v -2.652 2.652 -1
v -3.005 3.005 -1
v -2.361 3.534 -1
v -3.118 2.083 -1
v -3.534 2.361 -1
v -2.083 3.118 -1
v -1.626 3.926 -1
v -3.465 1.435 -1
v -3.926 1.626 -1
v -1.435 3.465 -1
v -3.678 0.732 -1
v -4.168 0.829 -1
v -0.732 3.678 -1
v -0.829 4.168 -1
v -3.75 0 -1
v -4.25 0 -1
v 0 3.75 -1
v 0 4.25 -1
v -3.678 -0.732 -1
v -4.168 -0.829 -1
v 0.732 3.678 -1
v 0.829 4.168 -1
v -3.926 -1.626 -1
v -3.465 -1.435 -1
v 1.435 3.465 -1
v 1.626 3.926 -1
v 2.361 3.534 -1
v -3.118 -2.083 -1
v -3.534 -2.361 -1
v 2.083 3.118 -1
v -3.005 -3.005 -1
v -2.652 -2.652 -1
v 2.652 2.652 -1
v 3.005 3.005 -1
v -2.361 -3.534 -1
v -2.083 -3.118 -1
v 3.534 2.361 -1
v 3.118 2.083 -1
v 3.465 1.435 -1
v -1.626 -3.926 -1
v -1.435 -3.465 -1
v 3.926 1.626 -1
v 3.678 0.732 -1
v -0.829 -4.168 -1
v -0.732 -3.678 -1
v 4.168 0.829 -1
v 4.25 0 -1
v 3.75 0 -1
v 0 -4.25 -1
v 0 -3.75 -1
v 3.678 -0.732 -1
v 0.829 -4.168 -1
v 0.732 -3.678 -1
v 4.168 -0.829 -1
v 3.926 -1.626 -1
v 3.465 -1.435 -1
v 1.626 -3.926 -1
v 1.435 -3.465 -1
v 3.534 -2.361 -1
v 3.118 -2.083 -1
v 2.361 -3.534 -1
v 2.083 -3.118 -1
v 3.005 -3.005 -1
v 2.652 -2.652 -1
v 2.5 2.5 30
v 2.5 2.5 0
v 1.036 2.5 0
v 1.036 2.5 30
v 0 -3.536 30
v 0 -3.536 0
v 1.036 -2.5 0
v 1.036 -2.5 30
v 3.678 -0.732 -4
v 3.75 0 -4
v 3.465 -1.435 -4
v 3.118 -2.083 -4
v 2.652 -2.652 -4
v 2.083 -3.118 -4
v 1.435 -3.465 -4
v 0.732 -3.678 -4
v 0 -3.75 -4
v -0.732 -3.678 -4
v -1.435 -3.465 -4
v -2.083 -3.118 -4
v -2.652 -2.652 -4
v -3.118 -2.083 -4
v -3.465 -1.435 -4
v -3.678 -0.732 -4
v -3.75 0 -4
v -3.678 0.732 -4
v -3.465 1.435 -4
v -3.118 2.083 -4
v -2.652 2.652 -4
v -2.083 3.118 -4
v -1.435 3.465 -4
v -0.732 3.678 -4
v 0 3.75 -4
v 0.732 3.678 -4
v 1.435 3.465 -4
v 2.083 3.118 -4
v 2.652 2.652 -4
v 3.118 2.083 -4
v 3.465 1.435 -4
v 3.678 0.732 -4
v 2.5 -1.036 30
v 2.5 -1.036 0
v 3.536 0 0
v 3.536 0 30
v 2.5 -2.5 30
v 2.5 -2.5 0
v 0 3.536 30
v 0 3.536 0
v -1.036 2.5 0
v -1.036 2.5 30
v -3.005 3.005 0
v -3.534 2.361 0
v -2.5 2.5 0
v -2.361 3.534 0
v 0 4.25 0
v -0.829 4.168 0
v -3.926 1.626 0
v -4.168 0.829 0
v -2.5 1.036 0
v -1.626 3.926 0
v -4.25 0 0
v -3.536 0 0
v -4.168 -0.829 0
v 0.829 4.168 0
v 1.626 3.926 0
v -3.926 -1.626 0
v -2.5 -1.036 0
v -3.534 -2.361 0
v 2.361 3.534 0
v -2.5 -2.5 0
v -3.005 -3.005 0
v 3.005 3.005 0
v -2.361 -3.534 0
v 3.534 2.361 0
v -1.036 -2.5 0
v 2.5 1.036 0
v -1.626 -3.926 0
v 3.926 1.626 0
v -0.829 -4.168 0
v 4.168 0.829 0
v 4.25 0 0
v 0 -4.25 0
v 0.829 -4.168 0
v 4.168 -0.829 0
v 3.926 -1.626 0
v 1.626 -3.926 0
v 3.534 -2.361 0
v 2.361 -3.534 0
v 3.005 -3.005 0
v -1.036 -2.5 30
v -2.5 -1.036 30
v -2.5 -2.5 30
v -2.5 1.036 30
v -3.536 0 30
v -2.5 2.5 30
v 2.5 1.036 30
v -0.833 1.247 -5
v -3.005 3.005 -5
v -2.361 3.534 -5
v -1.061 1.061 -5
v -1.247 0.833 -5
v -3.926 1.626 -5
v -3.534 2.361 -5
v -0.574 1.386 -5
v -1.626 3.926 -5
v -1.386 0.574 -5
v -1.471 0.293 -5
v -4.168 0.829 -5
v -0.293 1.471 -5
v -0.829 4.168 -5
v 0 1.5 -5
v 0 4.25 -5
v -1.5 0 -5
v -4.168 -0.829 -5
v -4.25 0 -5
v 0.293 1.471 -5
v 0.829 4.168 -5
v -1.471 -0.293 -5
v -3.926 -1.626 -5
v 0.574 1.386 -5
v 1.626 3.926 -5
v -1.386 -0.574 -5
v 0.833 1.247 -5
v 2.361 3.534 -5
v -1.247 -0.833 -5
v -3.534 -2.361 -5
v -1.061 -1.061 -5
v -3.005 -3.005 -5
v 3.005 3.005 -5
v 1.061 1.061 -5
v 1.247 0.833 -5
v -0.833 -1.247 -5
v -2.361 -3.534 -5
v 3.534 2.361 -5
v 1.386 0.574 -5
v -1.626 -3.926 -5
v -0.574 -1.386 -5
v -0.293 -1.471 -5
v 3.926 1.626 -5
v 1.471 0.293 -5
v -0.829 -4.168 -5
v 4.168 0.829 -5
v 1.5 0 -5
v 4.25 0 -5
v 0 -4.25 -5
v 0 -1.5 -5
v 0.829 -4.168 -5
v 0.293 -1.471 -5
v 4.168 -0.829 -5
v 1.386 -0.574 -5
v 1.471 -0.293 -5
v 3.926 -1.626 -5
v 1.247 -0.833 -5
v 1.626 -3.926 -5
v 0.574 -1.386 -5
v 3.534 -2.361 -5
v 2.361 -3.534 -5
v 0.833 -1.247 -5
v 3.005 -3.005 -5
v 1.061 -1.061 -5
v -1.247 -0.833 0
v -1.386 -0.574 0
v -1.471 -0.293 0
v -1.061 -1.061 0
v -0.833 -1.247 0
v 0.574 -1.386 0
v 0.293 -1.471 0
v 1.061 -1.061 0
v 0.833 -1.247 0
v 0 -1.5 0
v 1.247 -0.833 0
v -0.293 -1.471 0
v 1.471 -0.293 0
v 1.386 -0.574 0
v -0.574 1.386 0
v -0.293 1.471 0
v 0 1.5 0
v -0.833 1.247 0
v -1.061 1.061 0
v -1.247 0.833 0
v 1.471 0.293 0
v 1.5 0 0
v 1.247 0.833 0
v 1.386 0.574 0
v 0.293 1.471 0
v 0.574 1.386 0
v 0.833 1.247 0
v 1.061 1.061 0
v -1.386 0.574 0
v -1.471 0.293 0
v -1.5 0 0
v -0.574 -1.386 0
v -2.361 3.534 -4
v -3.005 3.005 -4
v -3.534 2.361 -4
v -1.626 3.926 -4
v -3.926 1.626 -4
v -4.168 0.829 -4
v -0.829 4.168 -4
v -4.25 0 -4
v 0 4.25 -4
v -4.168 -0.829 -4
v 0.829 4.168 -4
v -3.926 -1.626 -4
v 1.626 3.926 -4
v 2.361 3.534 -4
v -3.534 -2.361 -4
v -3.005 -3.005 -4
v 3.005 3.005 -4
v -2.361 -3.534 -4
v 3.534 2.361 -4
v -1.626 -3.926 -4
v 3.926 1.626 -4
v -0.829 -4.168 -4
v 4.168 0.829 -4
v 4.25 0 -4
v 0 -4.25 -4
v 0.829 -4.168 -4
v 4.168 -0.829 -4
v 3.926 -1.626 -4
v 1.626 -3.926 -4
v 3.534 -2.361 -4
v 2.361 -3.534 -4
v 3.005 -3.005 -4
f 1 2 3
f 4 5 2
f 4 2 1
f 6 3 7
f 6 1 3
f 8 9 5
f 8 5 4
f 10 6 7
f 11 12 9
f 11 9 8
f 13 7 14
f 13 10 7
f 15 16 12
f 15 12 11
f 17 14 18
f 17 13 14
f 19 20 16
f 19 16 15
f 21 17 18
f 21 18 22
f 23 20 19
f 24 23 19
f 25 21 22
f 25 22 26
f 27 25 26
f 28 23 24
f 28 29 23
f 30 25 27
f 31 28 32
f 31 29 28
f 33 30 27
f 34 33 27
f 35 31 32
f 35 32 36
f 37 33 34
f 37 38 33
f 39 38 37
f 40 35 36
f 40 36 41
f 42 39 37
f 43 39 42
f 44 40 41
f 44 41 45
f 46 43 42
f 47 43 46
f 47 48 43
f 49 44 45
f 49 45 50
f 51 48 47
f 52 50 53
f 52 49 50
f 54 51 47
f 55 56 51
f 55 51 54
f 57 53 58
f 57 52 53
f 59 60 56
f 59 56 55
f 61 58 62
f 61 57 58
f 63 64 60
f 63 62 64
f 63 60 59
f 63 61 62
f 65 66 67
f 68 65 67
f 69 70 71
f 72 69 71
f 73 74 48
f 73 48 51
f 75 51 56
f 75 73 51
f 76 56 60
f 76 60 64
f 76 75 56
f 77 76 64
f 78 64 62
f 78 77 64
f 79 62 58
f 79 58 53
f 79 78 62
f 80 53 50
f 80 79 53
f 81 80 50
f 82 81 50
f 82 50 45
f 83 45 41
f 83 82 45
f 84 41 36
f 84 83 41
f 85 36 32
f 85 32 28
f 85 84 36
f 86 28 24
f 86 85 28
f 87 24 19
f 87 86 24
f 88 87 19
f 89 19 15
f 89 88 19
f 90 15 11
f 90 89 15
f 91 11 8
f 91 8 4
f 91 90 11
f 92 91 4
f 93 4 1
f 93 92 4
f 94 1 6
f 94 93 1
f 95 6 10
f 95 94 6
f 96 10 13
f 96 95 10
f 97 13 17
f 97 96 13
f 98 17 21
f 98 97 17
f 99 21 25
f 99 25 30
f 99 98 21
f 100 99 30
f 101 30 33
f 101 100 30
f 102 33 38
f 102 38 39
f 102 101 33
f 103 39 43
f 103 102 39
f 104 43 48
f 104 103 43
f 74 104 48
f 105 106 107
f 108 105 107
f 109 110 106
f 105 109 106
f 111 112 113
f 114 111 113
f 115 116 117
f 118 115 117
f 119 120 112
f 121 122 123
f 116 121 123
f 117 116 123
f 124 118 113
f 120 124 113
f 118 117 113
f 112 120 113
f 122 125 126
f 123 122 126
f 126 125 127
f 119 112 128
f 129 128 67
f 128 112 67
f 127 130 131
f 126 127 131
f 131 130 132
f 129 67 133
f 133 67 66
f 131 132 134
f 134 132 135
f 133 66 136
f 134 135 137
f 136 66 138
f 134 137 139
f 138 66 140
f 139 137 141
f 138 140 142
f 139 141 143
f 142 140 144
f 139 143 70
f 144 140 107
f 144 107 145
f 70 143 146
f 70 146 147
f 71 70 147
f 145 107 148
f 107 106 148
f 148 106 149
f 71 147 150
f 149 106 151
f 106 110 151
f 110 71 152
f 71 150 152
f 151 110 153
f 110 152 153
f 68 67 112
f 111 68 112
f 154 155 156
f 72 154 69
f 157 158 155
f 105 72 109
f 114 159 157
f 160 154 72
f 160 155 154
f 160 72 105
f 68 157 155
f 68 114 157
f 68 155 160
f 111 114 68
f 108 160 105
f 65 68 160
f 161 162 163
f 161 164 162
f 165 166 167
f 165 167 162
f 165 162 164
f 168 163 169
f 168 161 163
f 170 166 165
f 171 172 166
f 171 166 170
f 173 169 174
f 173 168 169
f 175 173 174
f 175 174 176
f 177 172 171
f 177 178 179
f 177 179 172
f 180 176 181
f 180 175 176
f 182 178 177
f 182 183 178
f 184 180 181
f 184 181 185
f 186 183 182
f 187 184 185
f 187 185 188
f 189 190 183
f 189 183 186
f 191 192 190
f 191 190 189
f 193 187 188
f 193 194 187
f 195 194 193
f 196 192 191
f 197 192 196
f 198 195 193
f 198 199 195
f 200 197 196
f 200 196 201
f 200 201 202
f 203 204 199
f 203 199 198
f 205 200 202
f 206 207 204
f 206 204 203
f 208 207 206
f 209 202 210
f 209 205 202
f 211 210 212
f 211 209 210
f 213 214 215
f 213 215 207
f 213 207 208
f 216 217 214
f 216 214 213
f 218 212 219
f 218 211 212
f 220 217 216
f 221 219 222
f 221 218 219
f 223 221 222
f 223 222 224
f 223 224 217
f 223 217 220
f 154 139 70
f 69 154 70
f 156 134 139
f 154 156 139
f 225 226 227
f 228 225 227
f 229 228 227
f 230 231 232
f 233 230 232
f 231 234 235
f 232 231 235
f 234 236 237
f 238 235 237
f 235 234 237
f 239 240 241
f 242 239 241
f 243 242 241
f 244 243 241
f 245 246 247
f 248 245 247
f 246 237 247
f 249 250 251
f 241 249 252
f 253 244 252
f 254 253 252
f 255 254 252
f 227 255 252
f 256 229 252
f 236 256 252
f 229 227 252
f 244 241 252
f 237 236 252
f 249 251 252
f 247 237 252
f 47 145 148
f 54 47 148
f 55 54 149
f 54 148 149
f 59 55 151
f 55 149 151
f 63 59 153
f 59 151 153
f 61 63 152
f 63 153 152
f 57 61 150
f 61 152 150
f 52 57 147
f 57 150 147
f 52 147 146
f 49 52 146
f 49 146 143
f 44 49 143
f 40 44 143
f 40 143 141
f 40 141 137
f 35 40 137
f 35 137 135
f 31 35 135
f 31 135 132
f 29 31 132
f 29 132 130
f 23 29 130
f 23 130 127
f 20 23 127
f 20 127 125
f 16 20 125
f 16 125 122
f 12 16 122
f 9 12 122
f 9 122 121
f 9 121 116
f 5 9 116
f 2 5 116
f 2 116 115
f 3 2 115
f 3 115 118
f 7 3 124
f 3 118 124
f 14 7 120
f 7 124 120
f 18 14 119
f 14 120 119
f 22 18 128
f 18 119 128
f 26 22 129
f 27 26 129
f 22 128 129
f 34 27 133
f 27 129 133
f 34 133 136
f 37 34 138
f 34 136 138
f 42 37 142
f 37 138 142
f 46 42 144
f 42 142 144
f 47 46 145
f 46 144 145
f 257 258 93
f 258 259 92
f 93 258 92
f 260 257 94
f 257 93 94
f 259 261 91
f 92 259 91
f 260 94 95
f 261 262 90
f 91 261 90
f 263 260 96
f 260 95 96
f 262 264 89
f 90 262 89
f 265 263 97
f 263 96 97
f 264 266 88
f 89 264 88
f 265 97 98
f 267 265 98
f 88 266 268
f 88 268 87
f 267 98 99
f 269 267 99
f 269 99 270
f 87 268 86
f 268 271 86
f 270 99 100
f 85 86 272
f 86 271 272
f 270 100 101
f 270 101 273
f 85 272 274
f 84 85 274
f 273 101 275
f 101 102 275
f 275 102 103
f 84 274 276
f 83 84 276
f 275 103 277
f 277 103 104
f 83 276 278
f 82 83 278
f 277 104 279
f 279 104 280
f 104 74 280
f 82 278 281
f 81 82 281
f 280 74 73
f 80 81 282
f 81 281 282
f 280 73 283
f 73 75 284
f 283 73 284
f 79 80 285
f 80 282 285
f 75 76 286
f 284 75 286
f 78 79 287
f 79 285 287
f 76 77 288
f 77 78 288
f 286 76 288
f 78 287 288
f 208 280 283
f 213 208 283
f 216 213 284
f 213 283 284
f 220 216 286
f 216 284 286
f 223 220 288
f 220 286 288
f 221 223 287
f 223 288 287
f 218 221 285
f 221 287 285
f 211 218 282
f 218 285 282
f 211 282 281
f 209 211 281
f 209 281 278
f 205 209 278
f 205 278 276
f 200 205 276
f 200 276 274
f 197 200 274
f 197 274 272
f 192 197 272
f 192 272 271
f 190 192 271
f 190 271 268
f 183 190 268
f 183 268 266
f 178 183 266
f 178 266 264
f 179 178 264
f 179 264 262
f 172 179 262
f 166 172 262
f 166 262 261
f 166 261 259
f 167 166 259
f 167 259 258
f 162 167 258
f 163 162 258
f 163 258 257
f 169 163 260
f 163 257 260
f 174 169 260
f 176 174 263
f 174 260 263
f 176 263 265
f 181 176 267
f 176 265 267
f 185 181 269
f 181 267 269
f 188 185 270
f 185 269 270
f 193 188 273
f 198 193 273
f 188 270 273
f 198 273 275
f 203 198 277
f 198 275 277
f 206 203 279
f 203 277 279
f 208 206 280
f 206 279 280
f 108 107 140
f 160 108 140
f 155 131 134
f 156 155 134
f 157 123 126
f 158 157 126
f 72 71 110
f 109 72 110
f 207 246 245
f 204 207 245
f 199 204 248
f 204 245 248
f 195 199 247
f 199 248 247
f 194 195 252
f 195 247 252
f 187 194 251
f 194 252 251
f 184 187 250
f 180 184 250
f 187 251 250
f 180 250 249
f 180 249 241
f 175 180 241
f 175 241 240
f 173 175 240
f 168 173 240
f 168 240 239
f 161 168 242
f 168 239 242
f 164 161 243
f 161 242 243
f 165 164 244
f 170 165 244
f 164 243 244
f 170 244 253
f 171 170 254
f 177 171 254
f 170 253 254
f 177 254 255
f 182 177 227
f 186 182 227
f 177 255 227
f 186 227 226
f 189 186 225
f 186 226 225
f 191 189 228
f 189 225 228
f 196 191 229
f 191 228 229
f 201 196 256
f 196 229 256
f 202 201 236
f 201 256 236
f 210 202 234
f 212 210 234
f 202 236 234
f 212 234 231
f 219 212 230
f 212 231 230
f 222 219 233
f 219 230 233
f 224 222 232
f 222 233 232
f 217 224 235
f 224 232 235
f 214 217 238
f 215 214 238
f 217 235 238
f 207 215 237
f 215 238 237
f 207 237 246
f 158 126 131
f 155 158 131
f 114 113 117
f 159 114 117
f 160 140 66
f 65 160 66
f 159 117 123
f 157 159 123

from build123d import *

# Parameters (mm, degrees)
F1_DEPTH = 30
F2_R     = 4.25
F3_DEPTH = 5
F5_R     = 4.25
F5_R_2   = 3.75
F6_DEPTH = 3
F7_R     = 1.5
F8_DEPTH = 5


with BuildPart() as f1:
    # F0 (on Top) → F1 (new body)
    with BuildSketch(Plane.XY):
        Polygon((-2.5, -1.0355339059), (-2.5, -2.5), (-1.0355339059, -2.5), align=None)
        Polygon((-2.5, -1.0355339059), (-1.0355339059, -2.5), (1.0355339059, -2.5), (2.5, -1.0355339059), (2.5, 1.0355339059), (1.0355339059, 2.5), (-1.0355339059, 2.5), (-2.5, 1.0355339059), align=None)
        Polygon((1.0355339059, -2.5), (-1.0355339059, -2.5), (0, -3.5355339059), align=None)
        Polygon((-3.5355339059, 0), (-2.5, -1.0355339059), (-2.5, 1.0355339059), align=None)
        Polygon((2.5, -1.0355339059), (1.0355339059, -2.5), (2.5, -2.5), align=None)
        Polygon((-2.5, 2.5), (-2.5, 1.0355339059), (-1.0355339059, 2.5), align=None)
        Polygon((2.5, 1.0355339059), (2.5, -1.0355339059), (3.5355339059, 0), align=None)
        Polygon((0, 3.5355339059), (-1.0355339059, 2.5), (1.0355339059, 2.5), align=None)
        Polygon((1.0355339059, 2.5), (2.5, 1.0355339059), (2.5, 2.5), align=None)
    extrude(amount=F1_DEPTH)

    # F2 (on face) → F3 (join)
    with BuildSketch(Plane(origin=(0, 0, 0), x_dir=(1, 0, 0), z_dir=(0, 0, -1))):
        Circle(F2_R)
    extrude(amount=F3_DEPTH)

    # F5 (on offset) → F6 (cut)
    with BuildSketch(Plane(origin=(0, 0, -4), x_dir=(1, 0, 0), z_dir=(0, 0, -1))):
        Circle(F5_R)
        Circle(F5_R_2, mode=Mode.SUBTRACT)
    extrude(amount=-F6_DEPTH, mode=Mode.SUBTRACT)

    # F7 (on Top) → F8 (cut)
    with BuildSketch(Plane.XY):
        Circle(F7_R)
    extrude(amount=-F8_DEPTH, mode=Mode.SUBTRACT)


solid = f1.part
